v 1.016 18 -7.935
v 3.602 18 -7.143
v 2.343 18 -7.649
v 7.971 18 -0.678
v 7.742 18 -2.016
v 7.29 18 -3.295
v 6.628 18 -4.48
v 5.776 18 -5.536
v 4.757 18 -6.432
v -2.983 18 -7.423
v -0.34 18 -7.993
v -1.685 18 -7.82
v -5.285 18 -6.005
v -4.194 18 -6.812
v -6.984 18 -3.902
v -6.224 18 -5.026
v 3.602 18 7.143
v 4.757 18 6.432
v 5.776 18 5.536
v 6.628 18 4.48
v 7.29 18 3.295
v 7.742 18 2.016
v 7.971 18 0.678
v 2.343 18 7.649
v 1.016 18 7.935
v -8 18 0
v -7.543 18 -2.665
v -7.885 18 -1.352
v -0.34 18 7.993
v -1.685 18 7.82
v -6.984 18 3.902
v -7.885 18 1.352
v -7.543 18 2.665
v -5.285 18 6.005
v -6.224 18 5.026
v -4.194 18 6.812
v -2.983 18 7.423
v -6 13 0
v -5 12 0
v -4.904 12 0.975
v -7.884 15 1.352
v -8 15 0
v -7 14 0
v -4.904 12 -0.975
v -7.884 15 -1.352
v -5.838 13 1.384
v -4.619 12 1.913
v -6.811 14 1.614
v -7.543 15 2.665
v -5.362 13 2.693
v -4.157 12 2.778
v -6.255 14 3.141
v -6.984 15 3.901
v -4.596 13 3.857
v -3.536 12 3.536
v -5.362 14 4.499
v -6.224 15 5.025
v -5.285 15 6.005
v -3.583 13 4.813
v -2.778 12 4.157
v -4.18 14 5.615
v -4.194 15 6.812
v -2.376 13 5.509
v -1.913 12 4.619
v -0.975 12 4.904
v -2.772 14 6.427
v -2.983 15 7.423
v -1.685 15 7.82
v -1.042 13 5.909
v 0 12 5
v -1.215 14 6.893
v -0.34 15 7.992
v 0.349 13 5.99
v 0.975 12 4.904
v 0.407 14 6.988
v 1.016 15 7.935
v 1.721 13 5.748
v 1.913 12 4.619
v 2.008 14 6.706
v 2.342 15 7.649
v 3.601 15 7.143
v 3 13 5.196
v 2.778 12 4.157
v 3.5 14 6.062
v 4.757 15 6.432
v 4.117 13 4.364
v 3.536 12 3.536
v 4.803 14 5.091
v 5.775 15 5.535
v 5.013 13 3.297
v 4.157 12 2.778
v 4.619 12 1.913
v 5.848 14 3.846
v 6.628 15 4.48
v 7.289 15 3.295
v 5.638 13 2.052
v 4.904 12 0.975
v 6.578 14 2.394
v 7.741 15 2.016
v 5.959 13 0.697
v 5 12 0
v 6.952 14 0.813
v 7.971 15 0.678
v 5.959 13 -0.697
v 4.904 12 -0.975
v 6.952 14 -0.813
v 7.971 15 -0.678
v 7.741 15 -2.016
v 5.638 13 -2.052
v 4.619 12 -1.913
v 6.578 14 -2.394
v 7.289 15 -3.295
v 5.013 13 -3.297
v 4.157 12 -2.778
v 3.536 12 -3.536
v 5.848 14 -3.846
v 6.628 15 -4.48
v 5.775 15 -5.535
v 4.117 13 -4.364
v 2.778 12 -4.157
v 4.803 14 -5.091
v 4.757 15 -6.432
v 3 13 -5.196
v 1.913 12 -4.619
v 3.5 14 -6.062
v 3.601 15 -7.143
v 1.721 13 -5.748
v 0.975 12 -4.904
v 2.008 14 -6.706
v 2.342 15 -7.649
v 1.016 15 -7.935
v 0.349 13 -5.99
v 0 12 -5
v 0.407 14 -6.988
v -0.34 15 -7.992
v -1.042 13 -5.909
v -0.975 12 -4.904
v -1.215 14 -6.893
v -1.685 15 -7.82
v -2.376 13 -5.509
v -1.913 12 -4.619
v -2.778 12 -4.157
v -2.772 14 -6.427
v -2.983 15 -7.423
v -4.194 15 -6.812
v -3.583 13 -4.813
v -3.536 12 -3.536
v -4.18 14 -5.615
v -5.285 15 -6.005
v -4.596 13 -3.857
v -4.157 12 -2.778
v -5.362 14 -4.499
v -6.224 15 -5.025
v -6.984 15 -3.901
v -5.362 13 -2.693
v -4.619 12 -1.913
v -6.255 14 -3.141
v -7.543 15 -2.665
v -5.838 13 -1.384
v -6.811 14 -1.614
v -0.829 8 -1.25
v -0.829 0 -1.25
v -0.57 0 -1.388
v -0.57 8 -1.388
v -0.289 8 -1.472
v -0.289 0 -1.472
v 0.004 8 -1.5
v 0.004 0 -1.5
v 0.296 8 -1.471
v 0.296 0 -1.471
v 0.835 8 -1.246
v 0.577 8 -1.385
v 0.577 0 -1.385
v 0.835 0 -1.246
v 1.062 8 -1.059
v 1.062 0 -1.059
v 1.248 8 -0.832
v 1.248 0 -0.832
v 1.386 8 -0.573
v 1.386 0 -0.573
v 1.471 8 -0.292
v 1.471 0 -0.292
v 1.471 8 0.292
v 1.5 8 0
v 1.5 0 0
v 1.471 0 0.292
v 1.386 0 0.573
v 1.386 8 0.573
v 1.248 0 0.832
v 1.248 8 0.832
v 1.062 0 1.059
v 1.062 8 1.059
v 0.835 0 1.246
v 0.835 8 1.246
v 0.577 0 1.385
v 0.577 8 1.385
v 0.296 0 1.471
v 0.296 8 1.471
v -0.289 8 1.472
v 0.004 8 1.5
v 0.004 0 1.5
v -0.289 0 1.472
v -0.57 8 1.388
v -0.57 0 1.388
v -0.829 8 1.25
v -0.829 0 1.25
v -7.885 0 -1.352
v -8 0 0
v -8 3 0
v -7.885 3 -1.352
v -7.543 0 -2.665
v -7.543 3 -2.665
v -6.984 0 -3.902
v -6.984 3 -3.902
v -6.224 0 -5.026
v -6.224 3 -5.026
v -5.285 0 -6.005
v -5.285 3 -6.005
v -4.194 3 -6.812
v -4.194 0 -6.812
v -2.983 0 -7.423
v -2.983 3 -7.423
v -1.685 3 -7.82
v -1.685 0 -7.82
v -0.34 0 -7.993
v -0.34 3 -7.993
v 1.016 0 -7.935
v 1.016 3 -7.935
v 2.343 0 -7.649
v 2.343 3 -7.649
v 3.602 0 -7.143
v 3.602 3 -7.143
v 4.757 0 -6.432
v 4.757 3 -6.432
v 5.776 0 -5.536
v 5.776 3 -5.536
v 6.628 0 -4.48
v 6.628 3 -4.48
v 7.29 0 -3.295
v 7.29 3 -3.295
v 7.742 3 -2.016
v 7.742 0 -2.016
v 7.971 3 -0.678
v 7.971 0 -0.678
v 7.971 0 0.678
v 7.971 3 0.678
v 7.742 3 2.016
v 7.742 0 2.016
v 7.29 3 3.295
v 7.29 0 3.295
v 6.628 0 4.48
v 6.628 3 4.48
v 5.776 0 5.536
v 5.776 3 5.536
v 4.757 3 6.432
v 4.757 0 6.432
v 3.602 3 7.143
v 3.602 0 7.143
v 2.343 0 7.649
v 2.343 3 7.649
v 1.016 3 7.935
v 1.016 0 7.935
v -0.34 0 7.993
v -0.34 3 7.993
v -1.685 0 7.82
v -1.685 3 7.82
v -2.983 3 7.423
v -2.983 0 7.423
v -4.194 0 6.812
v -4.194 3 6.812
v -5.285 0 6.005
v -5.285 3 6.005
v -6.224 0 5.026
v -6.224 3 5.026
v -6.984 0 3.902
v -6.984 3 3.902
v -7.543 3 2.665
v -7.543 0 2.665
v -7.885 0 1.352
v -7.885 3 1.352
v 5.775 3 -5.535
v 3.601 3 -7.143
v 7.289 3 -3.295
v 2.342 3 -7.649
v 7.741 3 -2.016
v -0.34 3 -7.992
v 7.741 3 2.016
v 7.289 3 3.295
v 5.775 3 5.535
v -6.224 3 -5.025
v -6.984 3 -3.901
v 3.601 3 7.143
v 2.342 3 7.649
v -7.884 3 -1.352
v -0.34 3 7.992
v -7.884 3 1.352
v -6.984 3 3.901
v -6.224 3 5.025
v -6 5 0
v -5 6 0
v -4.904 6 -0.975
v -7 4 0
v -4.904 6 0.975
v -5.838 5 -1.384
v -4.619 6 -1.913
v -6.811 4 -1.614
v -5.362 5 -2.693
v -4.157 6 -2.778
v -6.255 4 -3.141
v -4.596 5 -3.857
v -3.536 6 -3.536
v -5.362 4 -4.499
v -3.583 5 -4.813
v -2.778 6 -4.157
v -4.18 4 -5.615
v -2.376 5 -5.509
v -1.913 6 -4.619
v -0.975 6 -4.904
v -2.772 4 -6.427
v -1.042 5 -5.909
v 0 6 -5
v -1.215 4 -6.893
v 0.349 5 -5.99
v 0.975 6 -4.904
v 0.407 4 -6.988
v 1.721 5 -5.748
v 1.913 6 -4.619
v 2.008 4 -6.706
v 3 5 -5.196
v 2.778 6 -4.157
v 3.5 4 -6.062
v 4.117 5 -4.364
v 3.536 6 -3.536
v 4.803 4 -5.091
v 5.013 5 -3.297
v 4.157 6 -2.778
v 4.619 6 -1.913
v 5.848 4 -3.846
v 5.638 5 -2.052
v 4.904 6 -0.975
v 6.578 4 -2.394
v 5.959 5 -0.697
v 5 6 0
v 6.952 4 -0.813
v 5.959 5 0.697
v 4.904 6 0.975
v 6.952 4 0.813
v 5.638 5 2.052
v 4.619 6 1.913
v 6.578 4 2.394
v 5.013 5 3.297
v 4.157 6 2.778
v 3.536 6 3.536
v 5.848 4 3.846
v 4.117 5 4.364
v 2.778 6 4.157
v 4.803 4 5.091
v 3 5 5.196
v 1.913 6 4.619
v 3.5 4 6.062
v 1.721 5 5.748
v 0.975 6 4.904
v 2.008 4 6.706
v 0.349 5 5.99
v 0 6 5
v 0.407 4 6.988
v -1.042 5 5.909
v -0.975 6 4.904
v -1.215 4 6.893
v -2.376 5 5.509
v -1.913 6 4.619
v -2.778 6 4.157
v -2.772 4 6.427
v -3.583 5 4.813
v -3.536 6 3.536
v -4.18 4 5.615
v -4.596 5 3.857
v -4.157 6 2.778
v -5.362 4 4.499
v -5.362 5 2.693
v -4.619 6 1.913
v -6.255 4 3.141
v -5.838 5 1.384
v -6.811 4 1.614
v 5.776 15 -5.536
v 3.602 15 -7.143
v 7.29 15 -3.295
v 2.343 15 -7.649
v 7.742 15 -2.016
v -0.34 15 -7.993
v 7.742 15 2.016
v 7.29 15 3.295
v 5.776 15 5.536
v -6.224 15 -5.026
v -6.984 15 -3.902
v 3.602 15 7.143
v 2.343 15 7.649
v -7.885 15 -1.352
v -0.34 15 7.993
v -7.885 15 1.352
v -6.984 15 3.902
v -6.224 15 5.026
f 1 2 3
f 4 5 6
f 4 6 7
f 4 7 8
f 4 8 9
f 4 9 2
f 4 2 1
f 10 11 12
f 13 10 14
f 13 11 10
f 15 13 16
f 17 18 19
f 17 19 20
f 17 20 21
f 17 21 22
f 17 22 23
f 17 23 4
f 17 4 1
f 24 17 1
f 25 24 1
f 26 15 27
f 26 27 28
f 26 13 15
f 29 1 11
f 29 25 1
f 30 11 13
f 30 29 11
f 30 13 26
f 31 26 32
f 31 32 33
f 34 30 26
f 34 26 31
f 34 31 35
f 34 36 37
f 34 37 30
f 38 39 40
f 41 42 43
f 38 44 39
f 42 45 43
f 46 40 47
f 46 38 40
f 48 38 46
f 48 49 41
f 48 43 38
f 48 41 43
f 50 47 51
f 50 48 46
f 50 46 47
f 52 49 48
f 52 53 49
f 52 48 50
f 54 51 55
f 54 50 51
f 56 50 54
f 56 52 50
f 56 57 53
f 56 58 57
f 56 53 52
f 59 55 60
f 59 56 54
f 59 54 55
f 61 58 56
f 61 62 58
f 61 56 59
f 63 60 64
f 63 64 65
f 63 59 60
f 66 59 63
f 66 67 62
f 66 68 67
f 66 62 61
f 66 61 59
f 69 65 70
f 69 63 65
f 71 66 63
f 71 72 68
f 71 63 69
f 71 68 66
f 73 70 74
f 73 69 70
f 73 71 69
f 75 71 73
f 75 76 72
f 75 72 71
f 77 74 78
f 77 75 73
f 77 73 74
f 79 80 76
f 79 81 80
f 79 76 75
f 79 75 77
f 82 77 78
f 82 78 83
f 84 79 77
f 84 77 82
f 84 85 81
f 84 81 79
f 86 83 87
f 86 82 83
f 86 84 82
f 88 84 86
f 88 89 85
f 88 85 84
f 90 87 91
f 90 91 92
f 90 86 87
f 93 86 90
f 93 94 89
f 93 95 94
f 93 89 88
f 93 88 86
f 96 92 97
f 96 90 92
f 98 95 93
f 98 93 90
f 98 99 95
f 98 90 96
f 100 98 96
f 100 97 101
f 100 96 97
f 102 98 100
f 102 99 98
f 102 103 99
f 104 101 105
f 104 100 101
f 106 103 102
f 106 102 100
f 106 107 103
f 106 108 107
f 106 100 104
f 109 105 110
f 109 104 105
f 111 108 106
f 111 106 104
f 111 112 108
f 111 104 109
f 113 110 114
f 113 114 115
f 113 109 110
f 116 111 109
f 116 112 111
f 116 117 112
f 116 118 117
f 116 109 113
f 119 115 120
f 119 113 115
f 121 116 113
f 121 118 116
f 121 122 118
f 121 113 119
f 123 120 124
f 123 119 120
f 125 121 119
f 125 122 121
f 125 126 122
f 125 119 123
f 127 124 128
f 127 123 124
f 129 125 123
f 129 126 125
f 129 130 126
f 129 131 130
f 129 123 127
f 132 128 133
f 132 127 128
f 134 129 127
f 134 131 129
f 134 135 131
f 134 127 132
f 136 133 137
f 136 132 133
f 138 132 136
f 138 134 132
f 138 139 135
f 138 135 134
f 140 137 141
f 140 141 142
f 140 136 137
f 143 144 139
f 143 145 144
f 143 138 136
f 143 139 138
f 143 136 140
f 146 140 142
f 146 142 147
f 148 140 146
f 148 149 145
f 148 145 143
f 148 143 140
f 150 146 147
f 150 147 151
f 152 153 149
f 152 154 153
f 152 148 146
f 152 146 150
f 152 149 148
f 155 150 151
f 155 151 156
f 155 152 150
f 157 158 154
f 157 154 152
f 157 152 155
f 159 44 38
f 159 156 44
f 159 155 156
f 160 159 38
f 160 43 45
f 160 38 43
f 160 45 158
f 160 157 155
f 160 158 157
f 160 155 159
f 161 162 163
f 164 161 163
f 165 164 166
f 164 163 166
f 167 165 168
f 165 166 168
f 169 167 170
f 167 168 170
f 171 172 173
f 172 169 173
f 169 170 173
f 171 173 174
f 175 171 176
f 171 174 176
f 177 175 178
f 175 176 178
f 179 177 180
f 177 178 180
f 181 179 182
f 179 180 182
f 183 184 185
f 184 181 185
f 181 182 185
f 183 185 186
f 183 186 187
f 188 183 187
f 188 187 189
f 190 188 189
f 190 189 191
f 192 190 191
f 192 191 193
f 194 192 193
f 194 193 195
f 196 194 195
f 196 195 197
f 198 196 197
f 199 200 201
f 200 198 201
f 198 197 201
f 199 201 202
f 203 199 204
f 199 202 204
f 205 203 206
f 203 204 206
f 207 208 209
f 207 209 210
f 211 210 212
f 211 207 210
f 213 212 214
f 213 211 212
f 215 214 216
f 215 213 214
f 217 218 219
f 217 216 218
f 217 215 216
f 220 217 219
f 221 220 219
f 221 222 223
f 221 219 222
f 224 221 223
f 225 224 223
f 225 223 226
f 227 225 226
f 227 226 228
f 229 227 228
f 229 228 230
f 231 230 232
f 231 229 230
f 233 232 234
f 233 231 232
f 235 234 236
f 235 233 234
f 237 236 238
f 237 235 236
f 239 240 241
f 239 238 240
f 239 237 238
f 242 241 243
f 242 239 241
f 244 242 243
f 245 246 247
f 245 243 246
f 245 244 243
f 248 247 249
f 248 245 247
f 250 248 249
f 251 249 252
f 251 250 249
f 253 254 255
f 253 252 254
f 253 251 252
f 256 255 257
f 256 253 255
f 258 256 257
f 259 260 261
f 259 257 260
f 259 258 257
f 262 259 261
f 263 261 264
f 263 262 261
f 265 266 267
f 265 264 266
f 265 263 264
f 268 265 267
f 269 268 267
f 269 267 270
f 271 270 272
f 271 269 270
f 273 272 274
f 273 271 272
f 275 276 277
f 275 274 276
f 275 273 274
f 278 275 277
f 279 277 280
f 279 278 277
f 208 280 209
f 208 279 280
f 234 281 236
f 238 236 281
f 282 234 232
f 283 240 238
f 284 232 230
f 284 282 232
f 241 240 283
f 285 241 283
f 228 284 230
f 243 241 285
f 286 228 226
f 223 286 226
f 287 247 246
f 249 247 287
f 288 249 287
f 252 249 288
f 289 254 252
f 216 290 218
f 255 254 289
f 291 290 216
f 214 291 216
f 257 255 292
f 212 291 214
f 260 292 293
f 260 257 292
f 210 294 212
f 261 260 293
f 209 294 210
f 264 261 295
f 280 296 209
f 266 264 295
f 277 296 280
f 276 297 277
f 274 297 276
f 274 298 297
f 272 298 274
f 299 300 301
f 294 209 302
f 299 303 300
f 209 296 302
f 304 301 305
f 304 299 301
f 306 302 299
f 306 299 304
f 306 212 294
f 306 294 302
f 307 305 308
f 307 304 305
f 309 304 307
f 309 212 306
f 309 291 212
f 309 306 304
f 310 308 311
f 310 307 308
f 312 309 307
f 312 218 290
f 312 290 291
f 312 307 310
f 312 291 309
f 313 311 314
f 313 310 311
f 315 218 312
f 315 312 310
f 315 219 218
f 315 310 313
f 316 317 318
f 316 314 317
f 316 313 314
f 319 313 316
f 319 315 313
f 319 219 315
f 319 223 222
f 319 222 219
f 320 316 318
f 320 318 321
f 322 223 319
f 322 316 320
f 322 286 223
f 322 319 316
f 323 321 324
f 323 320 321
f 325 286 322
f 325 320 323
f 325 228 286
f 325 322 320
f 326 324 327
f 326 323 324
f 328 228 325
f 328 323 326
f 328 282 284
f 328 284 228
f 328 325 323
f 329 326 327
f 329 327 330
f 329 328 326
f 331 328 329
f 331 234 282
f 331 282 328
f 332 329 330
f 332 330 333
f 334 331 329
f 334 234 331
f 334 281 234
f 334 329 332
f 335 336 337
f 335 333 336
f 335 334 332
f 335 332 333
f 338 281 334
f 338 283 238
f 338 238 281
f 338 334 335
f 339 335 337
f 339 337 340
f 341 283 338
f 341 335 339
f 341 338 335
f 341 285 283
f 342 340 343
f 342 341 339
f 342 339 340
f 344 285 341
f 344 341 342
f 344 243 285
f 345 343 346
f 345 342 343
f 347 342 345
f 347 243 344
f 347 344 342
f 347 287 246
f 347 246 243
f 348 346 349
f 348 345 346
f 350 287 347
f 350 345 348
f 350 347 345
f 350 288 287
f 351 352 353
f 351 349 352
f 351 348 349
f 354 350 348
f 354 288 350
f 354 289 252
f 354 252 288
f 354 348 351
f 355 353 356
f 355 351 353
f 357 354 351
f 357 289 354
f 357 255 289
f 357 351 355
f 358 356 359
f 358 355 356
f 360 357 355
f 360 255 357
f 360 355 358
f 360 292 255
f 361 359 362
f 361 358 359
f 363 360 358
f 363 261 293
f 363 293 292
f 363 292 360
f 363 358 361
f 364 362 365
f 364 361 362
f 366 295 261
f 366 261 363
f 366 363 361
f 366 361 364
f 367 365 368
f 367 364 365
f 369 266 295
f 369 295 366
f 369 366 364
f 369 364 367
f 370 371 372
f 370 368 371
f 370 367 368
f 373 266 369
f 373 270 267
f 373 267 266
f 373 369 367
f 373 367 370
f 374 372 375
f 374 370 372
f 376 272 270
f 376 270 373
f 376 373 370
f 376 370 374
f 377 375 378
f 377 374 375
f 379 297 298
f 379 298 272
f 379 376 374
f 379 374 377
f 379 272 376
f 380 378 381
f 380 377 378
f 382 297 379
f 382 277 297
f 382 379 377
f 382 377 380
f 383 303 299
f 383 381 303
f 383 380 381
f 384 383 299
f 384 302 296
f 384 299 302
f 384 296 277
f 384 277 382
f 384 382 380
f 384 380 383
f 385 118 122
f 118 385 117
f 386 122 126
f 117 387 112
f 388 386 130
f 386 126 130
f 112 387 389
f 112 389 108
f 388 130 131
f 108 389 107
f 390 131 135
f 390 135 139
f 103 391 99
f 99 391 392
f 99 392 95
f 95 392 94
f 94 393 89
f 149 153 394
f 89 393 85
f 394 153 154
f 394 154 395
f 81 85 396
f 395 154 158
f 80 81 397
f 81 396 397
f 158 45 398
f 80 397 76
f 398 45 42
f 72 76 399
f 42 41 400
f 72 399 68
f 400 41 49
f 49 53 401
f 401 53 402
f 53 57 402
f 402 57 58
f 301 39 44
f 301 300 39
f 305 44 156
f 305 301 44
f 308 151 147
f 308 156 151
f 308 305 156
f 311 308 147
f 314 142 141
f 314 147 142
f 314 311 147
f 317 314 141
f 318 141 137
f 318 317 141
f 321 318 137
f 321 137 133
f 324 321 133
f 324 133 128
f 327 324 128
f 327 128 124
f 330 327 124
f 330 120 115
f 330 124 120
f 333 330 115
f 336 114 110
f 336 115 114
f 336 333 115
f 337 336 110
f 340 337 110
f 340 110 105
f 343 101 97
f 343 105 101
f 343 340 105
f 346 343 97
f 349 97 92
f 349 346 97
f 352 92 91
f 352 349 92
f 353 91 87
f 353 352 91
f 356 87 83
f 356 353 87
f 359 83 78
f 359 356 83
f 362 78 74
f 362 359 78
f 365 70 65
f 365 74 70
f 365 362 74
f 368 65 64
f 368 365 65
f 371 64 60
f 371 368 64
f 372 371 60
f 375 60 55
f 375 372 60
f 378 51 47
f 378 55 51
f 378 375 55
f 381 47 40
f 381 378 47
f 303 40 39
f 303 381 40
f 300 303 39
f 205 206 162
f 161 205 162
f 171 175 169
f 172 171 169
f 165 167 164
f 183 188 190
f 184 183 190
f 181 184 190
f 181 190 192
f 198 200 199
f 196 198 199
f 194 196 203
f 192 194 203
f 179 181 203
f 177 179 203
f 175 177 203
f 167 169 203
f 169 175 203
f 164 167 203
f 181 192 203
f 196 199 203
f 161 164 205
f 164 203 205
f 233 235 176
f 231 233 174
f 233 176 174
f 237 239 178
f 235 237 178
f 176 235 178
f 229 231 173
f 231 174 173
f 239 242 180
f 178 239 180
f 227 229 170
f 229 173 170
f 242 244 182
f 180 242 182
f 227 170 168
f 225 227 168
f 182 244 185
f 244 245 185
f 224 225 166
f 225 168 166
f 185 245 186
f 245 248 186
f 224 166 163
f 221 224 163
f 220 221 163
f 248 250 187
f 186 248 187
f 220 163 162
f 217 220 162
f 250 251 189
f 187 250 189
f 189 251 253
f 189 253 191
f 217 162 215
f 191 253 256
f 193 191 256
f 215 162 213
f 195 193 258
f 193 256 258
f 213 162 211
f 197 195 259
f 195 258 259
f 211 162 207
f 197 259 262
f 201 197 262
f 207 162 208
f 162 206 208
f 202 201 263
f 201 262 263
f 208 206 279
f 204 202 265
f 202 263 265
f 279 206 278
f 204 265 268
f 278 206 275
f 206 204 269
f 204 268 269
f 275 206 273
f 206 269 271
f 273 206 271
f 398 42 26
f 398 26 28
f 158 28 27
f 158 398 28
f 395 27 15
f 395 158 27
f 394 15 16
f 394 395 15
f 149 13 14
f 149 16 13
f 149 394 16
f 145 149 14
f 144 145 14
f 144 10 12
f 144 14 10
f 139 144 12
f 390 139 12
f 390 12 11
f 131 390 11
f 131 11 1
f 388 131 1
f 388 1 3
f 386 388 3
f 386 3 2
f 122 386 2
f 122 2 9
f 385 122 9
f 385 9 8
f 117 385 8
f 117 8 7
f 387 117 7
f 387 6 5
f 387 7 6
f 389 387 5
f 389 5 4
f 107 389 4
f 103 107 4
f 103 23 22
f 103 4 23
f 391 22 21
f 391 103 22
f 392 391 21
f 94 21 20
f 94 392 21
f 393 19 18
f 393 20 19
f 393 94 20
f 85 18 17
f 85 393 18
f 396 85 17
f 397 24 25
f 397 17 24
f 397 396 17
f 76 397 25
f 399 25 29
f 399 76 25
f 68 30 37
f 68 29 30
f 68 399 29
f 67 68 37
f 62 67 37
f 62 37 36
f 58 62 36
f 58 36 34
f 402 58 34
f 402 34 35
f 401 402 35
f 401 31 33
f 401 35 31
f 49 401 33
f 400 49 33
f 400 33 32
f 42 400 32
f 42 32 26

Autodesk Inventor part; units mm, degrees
ref_plane "YZ Plane" through (0, 0, 0) normal (1, 0, 0) x (0, 1, 0)
ref_plane "XZ Plane" through (0, 0, 0) normal (0, 1, 0) x (-1, 0, 0)
ref_plane "XY Plane" through (0, 0, 0) normal (0, 0, 1) x (1, 0, 0)
sketch "Szkic1" plane through (0, 0, 0) normal (0, 1, 0) x (-1, 0, 0)
  circle A0 centre (0, 0) radius 8
  circle A1 centre (0, 0) radius 5
  arc A2 (0.8292, 1.25) -> (0.8292, -1.25) centre (0, 0) ccw
  line L0 (0.8292, 1.25) -> (0.8292, -1.25)
  dimension "d2" = 1.5
  dimension "d3" = 2.5
  dimension "d4" = 10
  dimension "d5" = 16
extrude "Wyciągnięcie proste1" add sketch "Szkic1" along normal blind 18 contours A0 | A1 | L0 A2
extrude "Wyciągnięcie proste2" cut sketch "Szkic1" along normal blind 15 contours A0
extrude "Wyciągnięcie proste3" add sketch "Szkic1" along normal blind 3 contours A0
extrude "Wyciągnięcie proste4" cut sketch "Szkic1" along normal blind 8 contours L0 A2
chamfer "Faza1" distance 3 angle 45 2 edges at (5, 3, 0) (5, 15, 0)
properties part number "kolo_napedowe" material "PLA"
